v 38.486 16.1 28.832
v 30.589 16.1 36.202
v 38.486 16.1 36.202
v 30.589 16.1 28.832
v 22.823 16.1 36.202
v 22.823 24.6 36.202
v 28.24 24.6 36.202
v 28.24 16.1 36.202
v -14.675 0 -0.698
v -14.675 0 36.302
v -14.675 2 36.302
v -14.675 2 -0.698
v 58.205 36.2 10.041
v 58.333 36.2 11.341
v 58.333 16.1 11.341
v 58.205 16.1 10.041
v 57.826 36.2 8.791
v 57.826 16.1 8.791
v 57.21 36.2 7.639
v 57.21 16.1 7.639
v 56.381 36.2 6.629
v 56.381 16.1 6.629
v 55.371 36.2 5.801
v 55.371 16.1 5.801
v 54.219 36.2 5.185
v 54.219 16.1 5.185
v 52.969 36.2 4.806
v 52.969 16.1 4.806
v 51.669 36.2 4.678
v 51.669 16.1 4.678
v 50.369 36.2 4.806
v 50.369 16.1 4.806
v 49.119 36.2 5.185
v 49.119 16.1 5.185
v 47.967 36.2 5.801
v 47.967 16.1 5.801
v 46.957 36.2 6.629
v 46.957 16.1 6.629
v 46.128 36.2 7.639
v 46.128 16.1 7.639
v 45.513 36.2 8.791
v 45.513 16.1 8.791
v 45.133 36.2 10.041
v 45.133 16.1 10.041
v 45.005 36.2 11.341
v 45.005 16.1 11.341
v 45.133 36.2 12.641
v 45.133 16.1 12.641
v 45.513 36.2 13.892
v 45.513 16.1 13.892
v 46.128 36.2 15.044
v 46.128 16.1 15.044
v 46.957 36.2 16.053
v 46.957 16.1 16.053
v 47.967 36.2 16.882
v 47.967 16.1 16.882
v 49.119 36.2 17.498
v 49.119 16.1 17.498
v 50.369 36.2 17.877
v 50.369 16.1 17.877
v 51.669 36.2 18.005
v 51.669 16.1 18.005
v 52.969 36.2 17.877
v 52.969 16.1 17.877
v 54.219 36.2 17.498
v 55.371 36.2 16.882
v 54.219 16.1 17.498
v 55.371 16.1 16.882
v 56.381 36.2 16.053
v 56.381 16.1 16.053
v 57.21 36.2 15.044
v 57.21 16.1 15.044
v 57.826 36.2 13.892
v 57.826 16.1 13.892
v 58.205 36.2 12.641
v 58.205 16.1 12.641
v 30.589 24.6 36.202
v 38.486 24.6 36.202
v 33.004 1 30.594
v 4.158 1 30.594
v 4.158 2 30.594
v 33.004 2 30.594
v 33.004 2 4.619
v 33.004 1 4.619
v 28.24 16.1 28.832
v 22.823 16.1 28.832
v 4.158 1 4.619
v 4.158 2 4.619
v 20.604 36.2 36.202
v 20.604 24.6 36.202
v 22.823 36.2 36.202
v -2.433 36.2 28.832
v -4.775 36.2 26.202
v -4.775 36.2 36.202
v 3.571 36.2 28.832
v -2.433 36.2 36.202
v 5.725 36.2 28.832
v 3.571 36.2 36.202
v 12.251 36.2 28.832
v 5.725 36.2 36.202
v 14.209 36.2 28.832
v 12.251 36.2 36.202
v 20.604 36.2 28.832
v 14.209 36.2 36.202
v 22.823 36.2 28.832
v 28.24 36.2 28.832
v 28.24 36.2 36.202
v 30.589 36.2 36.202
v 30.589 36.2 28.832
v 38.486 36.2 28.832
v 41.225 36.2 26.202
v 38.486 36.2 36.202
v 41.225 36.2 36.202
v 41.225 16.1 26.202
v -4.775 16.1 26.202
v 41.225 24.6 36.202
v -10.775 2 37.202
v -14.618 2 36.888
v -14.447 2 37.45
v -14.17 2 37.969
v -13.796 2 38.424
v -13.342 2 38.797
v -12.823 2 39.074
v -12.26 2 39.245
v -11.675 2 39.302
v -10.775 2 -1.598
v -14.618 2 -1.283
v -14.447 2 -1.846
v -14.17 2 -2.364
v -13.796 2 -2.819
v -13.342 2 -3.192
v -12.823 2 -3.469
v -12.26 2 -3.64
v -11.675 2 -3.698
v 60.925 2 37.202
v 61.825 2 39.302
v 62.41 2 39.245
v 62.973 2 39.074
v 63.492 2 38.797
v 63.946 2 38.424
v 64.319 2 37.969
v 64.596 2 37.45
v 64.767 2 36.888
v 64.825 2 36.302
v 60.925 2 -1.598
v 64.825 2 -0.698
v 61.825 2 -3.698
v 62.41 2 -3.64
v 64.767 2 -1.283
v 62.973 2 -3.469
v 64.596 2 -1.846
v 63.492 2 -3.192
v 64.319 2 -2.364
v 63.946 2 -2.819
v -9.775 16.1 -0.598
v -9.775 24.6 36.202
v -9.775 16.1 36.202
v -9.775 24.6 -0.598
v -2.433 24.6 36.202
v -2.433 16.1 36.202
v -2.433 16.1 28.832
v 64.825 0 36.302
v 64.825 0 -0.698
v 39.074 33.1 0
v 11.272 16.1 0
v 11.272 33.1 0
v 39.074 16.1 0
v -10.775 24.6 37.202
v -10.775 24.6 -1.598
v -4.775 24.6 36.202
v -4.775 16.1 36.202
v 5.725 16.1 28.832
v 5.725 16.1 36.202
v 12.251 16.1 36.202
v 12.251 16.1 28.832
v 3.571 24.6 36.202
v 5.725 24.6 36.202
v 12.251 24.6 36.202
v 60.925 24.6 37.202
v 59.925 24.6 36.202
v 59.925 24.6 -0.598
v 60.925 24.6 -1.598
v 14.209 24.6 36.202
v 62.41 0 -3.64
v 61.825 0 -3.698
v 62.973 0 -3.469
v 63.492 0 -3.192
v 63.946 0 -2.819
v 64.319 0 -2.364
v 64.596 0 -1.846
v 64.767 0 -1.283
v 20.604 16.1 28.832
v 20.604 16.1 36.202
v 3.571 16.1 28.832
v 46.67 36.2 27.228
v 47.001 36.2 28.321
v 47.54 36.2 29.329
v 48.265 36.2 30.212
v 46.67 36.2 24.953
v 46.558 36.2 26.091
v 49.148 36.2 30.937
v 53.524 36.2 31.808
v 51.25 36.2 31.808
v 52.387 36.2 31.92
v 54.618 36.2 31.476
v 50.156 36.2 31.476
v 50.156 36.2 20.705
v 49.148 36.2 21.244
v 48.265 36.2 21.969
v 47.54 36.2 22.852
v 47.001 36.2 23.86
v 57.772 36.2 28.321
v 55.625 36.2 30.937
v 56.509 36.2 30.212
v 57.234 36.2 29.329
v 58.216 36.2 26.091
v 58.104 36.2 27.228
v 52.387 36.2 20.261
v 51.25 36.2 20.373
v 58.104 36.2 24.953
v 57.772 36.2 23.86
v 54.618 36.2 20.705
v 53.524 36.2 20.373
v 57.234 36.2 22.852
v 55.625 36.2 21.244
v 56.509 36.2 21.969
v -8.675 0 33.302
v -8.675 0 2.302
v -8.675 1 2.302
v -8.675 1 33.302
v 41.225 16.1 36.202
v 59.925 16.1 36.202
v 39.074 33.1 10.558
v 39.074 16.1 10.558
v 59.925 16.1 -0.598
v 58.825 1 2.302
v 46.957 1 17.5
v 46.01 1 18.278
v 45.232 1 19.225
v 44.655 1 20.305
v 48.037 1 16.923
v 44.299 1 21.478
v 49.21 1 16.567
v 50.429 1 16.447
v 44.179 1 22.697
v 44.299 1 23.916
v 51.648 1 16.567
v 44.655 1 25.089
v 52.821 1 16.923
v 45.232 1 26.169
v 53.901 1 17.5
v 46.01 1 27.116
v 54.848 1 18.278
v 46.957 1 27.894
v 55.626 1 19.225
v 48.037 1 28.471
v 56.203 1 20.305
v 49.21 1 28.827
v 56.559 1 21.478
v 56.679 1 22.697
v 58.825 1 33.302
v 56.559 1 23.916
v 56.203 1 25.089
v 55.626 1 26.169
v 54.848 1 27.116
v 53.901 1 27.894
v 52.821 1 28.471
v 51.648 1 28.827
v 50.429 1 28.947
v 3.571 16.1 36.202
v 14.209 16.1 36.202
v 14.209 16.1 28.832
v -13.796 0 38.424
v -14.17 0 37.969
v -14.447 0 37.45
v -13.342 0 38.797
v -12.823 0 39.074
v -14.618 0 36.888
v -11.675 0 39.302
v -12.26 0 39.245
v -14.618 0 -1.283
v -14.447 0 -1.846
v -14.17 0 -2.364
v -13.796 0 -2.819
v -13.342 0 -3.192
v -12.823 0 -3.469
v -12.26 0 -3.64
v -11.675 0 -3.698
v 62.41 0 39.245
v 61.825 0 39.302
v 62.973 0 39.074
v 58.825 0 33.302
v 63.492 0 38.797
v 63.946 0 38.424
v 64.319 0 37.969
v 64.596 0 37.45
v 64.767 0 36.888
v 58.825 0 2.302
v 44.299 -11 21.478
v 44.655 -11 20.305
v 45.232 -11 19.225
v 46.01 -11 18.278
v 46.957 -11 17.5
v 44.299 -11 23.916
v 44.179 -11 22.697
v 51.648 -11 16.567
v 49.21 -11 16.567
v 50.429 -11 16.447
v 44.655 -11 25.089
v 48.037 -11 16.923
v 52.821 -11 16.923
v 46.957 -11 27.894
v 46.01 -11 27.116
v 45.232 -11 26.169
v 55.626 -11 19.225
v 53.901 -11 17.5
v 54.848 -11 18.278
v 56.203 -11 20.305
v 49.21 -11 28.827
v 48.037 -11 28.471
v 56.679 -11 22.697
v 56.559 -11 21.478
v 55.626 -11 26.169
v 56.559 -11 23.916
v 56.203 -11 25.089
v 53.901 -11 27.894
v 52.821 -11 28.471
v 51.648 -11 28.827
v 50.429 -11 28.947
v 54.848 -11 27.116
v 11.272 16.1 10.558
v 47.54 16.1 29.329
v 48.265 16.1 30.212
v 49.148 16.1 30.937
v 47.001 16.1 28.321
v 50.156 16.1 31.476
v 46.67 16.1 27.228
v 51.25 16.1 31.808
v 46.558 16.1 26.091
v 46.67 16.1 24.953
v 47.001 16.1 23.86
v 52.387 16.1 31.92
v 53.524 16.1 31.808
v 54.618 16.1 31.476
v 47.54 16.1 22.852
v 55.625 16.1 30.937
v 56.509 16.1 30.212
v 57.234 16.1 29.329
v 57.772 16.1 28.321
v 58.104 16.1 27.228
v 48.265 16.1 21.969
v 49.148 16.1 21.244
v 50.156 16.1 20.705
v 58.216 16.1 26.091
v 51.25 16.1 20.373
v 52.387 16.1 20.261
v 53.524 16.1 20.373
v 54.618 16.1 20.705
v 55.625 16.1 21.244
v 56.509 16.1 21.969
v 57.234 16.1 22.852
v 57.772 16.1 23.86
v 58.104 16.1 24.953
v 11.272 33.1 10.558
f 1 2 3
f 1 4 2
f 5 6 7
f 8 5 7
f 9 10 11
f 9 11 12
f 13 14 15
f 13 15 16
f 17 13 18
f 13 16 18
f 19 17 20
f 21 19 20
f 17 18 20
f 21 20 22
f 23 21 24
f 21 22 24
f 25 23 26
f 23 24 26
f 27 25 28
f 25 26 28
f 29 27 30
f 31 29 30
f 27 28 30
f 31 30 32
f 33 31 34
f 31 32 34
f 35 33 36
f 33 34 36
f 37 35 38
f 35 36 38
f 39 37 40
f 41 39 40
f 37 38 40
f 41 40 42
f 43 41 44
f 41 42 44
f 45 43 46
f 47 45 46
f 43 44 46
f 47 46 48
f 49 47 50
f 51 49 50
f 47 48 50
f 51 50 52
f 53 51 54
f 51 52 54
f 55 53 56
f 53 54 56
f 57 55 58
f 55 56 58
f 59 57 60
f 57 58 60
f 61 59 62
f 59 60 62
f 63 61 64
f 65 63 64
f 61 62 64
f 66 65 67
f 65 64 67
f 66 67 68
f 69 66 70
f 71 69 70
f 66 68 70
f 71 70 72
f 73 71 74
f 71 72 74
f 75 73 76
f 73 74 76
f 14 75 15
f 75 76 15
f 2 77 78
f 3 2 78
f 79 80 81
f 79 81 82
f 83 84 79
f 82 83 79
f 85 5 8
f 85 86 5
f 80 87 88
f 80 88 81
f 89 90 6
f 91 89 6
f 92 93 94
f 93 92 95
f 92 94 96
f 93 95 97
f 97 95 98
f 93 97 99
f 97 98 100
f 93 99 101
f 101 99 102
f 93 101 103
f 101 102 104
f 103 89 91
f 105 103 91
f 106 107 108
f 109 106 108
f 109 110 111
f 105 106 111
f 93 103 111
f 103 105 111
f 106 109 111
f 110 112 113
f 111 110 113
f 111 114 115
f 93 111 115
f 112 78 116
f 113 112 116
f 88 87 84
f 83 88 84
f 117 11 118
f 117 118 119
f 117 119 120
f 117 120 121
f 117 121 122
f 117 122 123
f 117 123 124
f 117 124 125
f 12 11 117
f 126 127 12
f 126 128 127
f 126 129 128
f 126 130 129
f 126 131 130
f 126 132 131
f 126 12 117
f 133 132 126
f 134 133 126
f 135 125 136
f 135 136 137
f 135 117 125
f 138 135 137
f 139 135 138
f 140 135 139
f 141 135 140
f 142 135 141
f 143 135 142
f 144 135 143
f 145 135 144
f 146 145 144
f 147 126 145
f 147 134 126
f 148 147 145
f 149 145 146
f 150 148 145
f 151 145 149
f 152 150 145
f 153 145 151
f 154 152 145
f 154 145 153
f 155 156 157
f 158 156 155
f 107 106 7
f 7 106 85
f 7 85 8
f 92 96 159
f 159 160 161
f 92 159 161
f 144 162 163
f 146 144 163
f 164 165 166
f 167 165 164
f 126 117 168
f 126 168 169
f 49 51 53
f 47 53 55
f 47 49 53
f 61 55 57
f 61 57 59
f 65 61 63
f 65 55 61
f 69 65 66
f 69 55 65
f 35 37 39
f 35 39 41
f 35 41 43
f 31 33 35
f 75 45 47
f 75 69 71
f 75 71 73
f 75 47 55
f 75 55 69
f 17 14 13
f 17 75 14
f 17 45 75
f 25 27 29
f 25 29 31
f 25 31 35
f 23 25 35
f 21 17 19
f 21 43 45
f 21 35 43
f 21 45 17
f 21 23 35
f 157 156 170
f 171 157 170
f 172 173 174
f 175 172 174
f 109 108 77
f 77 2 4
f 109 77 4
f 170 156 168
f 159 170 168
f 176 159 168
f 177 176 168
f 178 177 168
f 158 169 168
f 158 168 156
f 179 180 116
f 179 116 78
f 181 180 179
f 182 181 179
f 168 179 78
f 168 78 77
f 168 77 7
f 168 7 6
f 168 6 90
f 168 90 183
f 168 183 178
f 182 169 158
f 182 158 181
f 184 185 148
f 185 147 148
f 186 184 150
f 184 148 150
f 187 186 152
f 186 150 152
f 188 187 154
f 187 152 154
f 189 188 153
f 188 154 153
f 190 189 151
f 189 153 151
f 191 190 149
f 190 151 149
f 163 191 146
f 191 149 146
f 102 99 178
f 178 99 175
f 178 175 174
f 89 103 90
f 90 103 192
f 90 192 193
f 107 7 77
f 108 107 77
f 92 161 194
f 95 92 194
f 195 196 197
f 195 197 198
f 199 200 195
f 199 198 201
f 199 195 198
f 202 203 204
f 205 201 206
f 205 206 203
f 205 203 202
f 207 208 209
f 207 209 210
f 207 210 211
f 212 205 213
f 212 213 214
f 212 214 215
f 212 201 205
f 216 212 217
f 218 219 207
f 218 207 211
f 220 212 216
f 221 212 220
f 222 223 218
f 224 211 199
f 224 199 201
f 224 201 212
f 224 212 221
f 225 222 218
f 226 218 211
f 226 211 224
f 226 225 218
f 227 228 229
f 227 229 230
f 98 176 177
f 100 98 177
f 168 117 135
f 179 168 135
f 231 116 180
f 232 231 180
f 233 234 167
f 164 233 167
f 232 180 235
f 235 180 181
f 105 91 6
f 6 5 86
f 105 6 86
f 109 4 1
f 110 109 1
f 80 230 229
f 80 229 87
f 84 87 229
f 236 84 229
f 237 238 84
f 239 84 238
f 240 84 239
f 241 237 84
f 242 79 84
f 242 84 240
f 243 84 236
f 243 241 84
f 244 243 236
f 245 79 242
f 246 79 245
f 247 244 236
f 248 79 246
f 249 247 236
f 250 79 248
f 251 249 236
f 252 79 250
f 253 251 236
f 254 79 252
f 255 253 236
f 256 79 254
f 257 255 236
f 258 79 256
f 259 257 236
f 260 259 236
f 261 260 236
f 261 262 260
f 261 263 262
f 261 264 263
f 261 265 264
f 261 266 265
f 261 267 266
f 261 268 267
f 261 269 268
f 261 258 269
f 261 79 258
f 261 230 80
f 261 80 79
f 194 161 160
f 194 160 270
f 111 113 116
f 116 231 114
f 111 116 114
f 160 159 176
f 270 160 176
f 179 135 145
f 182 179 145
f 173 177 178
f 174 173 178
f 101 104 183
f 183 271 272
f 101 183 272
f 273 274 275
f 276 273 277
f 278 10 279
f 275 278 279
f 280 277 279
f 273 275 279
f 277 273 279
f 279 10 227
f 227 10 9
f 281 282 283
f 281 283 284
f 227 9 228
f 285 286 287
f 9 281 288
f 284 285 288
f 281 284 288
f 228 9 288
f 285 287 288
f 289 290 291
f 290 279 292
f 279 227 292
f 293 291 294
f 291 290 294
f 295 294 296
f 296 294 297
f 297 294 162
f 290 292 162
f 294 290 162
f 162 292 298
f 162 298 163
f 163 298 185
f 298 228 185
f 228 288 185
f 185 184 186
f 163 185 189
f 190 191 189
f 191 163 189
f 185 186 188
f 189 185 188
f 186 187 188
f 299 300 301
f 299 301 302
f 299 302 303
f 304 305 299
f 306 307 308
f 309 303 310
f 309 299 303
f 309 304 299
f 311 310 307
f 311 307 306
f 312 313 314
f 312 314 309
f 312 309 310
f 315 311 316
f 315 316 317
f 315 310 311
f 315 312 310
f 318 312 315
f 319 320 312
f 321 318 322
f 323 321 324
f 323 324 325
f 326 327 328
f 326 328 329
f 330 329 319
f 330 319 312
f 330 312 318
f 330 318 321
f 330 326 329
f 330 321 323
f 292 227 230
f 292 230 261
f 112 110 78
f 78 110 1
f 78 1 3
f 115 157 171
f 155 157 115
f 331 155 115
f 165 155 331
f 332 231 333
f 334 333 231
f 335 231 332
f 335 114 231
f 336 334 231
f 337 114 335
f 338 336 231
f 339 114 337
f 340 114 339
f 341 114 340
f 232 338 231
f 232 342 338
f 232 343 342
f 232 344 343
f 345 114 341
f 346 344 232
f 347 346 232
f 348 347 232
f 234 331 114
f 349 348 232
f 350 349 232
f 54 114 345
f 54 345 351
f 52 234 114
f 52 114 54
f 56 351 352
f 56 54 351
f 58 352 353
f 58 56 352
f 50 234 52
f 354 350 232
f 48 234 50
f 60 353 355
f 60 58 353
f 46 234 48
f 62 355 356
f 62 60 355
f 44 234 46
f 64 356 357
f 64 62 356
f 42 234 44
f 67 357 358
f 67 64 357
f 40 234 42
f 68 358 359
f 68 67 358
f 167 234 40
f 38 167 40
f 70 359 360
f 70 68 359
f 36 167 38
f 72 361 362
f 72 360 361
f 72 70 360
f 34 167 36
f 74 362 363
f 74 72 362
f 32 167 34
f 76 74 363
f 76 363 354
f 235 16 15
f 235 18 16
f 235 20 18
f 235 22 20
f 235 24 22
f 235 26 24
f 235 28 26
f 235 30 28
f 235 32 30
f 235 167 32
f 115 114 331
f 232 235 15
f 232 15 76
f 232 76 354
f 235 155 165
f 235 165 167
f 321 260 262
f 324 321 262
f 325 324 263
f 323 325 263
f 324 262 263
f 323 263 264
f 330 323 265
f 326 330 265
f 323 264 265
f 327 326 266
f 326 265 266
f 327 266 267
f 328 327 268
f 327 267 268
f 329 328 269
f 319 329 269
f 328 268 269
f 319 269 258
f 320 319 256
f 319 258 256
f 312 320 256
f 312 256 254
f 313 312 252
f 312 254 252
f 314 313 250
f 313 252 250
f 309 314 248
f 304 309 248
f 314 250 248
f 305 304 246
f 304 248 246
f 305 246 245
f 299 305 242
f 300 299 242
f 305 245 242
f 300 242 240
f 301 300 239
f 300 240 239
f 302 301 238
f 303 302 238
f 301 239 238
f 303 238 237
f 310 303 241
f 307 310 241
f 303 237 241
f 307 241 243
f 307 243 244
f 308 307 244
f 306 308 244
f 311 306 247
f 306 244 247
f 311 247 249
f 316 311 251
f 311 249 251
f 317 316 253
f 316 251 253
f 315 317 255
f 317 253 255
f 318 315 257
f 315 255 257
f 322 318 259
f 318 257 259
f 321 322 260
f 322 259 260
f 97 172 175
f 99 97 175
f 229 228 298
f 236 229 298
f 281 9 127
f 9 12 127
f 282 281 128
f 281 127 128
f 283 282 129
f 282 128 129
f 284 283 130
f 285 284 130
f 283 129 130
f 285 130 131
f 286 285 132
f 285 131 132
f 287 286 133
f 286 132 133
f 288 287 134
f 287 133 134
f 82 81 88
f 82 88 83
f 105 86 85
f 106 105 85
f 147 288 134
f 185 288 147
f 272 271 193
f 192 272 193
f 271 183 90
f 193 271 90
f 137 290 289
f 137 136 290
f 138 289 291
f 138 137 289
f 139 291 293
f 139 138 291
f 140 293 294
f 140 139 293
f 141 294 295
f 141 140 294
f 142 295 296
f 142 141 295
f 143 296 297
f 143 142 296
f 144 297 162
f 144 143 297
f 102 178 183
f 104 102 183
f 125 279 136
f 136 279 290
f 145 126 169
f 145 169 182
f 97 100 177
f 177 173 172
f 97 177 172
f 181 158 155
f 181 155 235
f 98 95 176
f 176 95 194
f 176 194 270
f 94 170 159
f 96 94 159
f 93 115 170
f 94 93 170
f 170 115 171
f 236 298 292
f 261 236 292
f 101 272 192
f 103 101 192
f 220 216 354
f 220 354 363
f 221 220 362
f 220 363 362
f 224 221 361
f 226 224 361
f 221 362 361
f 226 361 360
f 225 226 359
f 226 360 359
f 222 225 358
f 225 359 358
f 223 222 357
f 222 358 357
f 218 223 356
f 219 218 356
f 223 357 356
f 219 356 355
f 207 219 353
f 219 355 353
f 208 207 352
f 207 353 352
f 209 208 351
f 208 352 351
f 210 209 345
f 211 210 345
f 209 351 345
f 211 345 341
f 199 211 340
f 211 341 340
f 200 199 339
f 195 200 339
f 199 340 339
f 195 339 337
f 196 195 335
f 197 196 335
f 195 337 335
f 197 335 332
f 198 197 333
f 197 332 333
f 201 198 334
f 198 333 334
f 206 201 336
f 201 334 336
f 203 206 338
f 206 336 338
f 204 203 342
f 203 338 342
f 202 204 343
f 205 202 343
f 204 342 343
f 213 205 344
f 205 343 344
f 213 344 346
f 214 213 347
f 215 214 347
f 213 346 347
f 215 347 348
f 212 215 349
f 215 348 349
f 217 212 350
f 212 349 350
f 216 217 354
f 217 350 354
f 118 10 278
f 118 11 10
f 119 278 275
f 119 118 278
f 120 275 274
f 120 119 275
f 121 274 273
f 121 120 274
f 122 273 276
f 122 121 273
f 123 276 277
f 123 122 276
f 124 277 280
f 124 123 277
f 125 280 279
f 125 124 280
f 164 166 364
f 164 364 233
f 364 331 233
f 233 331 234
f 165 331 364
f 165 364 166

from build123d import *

# Parameters (mm, degrees)
SKETCH1_W           = 79.5
SKETCH1_H           = 43
BOSS_EXTRUDE1_DEPTH = 2
SKETCH2_W           = 71.7
SKETCH2_H           = 38.8
BOSS_EXTRUDE2_DEPTH = 22.6
SKETCH3_W           = 69.7
SKETCH3_H           = 36.8
CUT_EXTRUDE1_DEPTH  = 8.5
BOSS_EXTRUDE3_DEPTH = 22.6
SKETCH6_W           = 67.219676188
SKETCH6_H           = 8.940869551
CUT_EXTRUDE2_DEPTH  = 22.6
SKETCH7_R           = 6.66374012
SKETCH7_R_2         = 5.829163104
BOSS_EXTRUDE4_DEPTH = 20.1
FILLET1_R           = 3
SKETCH8_W           = 27.801535977
SKETCH8_H           = 10.55826339
BOSS_EXTRUDE5_DEPTH = 17
SKETCH9_W           = 67.5
SKETCH9_H           = 31
CUT_EXTRUDE3_DEPTH  = 1
SKETCH10_W          = 28.845725121
SKETCH10_H          = 25.974204973
CUT_EXTRUDE4_DEPTH  = 1
SKETCH11_R          = 6.25
BOSS_EXTRUDE6_DEPTH = 12


with BuildPart() as part:
    # Sketch1 → Boss-Extrude1 (new body)
    with BuildSketch(Plane(origin=(0, 0, 0), x_dir=(1, 0, 0), z_dir=(0, 1, 0))):
        with Locations((25.074854651, -17.802325581)):
            Rectangle(SKETCH1_W, SKETCH1_H)
    extrude(amount=BOSS_EXTRUDE1_DEPTH)

    # Sketch2 → Boss-Extrude2 (add)
    with BuildSketch(Plane(origin=(0, 2, 0), x_dir=(1, 0, 0), z_dir=(0, 1, 0))):
        with Locations((25.074854651, -17.802325581)):
            Rectangle(SKETCH2_W, SKETCH2_H)
    extrude(amount=BOSS_EXTRUDE2_DEPTH)

    # Sketch3 → Cut-Extrude1 (cut)
    with BuildSketch(Plane(origin=(0, 24.6, 0), x_dir=(1, 0, 0), z_dir=(0, 1, 0))):
        with Locations((25.074854651, -17.802325581)):
            Rectangle(SKETCH3_W, SKETCH3_H)
    extrude(amount=-CUT_EXTRUDE1_DEPTH, mode=Mode.SUBTRACT)

    # Sketch5 → Boss-Extrude3 (add)
    with BuildSketch(Plane(origin=(0, 16.1, 0), x_dir=(1, 0, 0), z_dir=(0, 1, 0))):
        Polygon((41.224854651, -26.202325581), (-4.775145349, -26.202325581), (-4.775145349, -36.202325581), (-2.433003128, -36.202325581), (-2.433003128, -28.831573422), (3.571084453, -28.831573422), (3.571084453, -36.202325581), (5.724724564, -36.202325581), (5.724724564, -28.831573422), (12.250906718, -28.831573422), (12.250906718, -36.202325581), (14.208761365, -36.202325581), (14.208761365, -28.831573422), (20.604419876, -28.831573422), (20.604419876, -36.202325581), (22.823321808, -36.202325581), (22.823321808, -28.831573422), (28.240052996, -28.831573422), (28.240052996, -36.202325581), (30.589478571, -36.202325581), (30.589478571, -28.831573422), (38.486158978, -28.831573422), (38.486158978, -36.202325581), (41.224854651, -36.202325581), align=None)
    extrude(amount=BOSS_EXTRUDE3_DEPTH)

    # Sketch6 → Cut-Extrude2 (cut)
    with BuildSketch(Plane.XY.offset(37.202325581)):
        with Locations((18.972874337, 40.670434775)):
            Rectangle(SKETCH6_W, SKETCH6_H)
    extrude(amount=-CUT_EXTRUDE2_DEPTH, mode=Mode.SUBTRACT)

    # Sketch7 → Boss-Extrude4 (add)
    with BuildSketch(Plane(origin=(0, 16.1, 0), x_dir=(1, 0, 0), z_dir=(0, 1, 0))):
        with Locations((51.669046929, -11.341405249)):
            Circle(SKETCH7_R)
        with Locations((52.386926966, -26.090576917)):
            Circle(SKETCH7_R_2)
    extrude(amount=BOSS_EXTRUDE4_DEPTH)

    # Fillet1
    fillet1_edges = [part.edges().sort_by_distance(p)[0] for p in [
        (-14.675145349, 1, -3.697674419),
        (64.824854651, 1, -3.697674419),
        (64.824854651, 1, 39.302325581),
        (-14.675145349, 1, 39.302325581),
    ]]
    fillet(fillet1_edges, radius=FILLET1_R)

    # Sketch8 → Boss-Extrude5 (add)
    with BuildSketch(Plane(origin=(0, 16.1, 0), x_dir=(1, 0, 0), z_dir=(0, 1, 0))):
        with Locations((25.172747384, -5.279131695)):
            Rectangle(SKETCH8_W, SKETCH8_H)
    extrude(amount=BOSS_EXTRUDE5_DEPTH)

    # Sketch9 → Cut-Extrude3 (cut)
    with BuildSketch(Plane.XZ):
        with Locations((25.074854651, 17.802325581)):
            Rectangle(SKETCH9_W, SKETCH9_H)
    extrude(amount=-CUT_EXTRUDE3_DEPTH, mode=Mode.SUBTRACT)

    # Sketch10 → Cut-Extrude4 (cut)
    with BuildSketch(Plane.XZ.offset(-1)):
        with Locations((18.581303408, 17.606540116)):
            Rectangle(SKETCH10_W, SKETCH10_H)
    extrude(amount=-CUT_EXTRUDE4_DEPTH, mode=Mode.SUBTRACT)

    # Sketch11 → Boss-Extrude6 (add)
    with BuildSketch(Plane.XZ.offset(-1)):
        with Locations((50.42907232, 22.696962197)):
            Circle(SKETCH11_R)
    extrude(amount=BOSS_EXTRUDE6_DEPTH)


solid = part.part
